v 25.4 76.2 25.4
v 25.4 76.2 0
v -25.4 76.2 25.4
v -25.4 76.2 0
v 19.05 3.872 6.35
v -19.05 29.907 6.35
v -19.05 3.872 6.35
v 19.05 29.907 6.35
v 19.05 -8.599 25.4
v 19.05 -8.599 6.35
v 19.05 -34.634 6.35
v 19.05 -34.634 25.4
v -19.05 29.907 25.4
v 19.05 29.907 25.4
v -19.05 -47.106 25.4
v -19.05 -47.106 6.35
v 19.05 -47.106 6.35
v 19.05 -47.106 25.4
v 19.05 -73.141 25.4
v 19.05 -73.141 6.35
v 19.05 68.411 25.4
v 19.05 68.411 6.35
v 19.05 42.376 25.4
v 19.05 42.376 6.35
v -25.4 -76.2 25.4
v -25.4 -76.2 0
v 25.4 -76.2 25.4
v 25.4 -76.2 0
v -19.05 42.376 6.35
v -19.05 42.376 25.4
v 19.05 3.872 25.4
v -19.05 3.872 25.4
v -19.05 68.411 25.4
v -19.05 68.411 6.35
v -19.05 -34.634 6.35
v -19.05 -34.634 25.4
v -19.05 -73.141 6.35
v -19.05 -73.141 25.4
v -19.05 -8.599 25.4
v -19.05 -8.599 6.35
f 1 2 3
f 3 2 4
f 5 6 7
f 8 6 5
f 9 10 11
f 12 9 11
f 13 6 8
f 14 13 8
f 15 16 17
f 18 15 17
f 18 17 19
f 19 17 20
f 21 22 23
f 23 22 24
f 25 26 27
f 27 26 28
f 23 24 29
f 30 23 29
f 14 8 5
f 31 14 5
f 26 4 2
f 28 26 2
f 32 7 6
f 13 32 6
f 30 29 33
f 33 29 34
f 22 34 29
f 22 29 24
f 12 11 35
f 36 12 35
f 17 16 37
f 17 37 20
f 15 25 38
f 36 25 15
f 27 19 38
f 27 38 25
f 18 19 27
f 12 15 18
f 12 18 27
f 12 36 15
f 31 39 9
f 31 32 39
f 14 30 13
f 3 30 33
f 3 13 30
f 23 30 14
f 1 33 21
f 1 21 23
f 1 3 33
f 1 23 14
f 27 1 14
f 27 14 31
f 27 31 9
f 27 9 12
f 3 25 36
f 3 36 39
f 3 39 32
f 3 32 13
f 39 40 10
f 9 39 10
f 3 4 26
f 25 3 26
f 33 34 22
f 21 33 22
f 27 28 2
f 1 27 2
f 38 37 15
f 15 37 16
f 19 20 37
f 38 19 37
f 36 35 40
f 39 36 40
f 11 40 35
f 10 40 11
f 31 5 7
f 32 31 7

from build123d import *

# Parameters (mm, degrees)
F1_DEPTH = 25.4
F2_DEPTH = 6.35


with BuildPart() as f1:
    # F0 (on Top) → F1 (new body)
    with BuildSketch(Plane.XY):
        Polygon((25.4, -76.2), (25.4, 76.2), (0, 76.2), (-25.4, 76.2), (-25.4, -76.2), align=None)
        Polygon((-19.05, -47.105642), (0, -47.105642), (19.05, -47.105642), (19.05, -73.140642), (-19.05, -73.140642), align=None, mode=Mode.SUBTRACT)
        Polygon((-19.05, -8.599242), (0, -8.599242), (19.05, -8.599242), (19.05, -34.634242), (0, -34.634242), (-19.05, -34.634242), align=None, mode=Mode.SUBTRACT)
        Polygon((-19.05, 29.907158), (0, 29.907158), (19.05, 29.907158), (19.05, 3.872158), (0, 3.872158), (-19.05, 3.872158), align=None, mode=Mode.SUBTRACT)
        Polygon((-19.05, 68.410887), (19.05, 68.410887), (19.05, 42.375887), (0, 42.375887), (-19.05, 42.375887), align=None, mode=Mode.SUBTRACT)
    extrude(amount=F1_DEPTH)

    # F0 (on Top) → F2 (join)
    with BuildSketch(Plane.XY):
        Polygon((19.05, 42.375887), (19.05, 68.410887), (-19.05, 68.410887), (-19.05, 42.375887), (0, 42.375887), align=None)
        Polygon((19.05, 29.907158), (0, 29.907158), (0, 29.675887), (0, 16.889658), (0, 3.872158), (19.05, 3.872158), align=None)
        Polygon((0, 29.675887), (0, 29.907158), (-19.05, 29.907158), (-19.05, 3.872158), (0, 3.872158), (0, 16.889658), align=None)
        Polygon((0, -21.616742), (0, -8.599242), (-19.05, -8.599242), (-19.05, -34.634242), (0, -34.634242), align=None)
        Polygon((19.05, -8.599242), (0, -8.599242), (0, -21.616742), (0, -34.634242), (19.05, -34.634242), align=None)
        Polygon((19.05, -47.105642), (0, -47.105642), (-19.05, -47.105642), (-19.05, -73.140642), (19.05, -73.140642), align=None)
    extrude(amount=F2_DEPTH)


solid = f1.part
